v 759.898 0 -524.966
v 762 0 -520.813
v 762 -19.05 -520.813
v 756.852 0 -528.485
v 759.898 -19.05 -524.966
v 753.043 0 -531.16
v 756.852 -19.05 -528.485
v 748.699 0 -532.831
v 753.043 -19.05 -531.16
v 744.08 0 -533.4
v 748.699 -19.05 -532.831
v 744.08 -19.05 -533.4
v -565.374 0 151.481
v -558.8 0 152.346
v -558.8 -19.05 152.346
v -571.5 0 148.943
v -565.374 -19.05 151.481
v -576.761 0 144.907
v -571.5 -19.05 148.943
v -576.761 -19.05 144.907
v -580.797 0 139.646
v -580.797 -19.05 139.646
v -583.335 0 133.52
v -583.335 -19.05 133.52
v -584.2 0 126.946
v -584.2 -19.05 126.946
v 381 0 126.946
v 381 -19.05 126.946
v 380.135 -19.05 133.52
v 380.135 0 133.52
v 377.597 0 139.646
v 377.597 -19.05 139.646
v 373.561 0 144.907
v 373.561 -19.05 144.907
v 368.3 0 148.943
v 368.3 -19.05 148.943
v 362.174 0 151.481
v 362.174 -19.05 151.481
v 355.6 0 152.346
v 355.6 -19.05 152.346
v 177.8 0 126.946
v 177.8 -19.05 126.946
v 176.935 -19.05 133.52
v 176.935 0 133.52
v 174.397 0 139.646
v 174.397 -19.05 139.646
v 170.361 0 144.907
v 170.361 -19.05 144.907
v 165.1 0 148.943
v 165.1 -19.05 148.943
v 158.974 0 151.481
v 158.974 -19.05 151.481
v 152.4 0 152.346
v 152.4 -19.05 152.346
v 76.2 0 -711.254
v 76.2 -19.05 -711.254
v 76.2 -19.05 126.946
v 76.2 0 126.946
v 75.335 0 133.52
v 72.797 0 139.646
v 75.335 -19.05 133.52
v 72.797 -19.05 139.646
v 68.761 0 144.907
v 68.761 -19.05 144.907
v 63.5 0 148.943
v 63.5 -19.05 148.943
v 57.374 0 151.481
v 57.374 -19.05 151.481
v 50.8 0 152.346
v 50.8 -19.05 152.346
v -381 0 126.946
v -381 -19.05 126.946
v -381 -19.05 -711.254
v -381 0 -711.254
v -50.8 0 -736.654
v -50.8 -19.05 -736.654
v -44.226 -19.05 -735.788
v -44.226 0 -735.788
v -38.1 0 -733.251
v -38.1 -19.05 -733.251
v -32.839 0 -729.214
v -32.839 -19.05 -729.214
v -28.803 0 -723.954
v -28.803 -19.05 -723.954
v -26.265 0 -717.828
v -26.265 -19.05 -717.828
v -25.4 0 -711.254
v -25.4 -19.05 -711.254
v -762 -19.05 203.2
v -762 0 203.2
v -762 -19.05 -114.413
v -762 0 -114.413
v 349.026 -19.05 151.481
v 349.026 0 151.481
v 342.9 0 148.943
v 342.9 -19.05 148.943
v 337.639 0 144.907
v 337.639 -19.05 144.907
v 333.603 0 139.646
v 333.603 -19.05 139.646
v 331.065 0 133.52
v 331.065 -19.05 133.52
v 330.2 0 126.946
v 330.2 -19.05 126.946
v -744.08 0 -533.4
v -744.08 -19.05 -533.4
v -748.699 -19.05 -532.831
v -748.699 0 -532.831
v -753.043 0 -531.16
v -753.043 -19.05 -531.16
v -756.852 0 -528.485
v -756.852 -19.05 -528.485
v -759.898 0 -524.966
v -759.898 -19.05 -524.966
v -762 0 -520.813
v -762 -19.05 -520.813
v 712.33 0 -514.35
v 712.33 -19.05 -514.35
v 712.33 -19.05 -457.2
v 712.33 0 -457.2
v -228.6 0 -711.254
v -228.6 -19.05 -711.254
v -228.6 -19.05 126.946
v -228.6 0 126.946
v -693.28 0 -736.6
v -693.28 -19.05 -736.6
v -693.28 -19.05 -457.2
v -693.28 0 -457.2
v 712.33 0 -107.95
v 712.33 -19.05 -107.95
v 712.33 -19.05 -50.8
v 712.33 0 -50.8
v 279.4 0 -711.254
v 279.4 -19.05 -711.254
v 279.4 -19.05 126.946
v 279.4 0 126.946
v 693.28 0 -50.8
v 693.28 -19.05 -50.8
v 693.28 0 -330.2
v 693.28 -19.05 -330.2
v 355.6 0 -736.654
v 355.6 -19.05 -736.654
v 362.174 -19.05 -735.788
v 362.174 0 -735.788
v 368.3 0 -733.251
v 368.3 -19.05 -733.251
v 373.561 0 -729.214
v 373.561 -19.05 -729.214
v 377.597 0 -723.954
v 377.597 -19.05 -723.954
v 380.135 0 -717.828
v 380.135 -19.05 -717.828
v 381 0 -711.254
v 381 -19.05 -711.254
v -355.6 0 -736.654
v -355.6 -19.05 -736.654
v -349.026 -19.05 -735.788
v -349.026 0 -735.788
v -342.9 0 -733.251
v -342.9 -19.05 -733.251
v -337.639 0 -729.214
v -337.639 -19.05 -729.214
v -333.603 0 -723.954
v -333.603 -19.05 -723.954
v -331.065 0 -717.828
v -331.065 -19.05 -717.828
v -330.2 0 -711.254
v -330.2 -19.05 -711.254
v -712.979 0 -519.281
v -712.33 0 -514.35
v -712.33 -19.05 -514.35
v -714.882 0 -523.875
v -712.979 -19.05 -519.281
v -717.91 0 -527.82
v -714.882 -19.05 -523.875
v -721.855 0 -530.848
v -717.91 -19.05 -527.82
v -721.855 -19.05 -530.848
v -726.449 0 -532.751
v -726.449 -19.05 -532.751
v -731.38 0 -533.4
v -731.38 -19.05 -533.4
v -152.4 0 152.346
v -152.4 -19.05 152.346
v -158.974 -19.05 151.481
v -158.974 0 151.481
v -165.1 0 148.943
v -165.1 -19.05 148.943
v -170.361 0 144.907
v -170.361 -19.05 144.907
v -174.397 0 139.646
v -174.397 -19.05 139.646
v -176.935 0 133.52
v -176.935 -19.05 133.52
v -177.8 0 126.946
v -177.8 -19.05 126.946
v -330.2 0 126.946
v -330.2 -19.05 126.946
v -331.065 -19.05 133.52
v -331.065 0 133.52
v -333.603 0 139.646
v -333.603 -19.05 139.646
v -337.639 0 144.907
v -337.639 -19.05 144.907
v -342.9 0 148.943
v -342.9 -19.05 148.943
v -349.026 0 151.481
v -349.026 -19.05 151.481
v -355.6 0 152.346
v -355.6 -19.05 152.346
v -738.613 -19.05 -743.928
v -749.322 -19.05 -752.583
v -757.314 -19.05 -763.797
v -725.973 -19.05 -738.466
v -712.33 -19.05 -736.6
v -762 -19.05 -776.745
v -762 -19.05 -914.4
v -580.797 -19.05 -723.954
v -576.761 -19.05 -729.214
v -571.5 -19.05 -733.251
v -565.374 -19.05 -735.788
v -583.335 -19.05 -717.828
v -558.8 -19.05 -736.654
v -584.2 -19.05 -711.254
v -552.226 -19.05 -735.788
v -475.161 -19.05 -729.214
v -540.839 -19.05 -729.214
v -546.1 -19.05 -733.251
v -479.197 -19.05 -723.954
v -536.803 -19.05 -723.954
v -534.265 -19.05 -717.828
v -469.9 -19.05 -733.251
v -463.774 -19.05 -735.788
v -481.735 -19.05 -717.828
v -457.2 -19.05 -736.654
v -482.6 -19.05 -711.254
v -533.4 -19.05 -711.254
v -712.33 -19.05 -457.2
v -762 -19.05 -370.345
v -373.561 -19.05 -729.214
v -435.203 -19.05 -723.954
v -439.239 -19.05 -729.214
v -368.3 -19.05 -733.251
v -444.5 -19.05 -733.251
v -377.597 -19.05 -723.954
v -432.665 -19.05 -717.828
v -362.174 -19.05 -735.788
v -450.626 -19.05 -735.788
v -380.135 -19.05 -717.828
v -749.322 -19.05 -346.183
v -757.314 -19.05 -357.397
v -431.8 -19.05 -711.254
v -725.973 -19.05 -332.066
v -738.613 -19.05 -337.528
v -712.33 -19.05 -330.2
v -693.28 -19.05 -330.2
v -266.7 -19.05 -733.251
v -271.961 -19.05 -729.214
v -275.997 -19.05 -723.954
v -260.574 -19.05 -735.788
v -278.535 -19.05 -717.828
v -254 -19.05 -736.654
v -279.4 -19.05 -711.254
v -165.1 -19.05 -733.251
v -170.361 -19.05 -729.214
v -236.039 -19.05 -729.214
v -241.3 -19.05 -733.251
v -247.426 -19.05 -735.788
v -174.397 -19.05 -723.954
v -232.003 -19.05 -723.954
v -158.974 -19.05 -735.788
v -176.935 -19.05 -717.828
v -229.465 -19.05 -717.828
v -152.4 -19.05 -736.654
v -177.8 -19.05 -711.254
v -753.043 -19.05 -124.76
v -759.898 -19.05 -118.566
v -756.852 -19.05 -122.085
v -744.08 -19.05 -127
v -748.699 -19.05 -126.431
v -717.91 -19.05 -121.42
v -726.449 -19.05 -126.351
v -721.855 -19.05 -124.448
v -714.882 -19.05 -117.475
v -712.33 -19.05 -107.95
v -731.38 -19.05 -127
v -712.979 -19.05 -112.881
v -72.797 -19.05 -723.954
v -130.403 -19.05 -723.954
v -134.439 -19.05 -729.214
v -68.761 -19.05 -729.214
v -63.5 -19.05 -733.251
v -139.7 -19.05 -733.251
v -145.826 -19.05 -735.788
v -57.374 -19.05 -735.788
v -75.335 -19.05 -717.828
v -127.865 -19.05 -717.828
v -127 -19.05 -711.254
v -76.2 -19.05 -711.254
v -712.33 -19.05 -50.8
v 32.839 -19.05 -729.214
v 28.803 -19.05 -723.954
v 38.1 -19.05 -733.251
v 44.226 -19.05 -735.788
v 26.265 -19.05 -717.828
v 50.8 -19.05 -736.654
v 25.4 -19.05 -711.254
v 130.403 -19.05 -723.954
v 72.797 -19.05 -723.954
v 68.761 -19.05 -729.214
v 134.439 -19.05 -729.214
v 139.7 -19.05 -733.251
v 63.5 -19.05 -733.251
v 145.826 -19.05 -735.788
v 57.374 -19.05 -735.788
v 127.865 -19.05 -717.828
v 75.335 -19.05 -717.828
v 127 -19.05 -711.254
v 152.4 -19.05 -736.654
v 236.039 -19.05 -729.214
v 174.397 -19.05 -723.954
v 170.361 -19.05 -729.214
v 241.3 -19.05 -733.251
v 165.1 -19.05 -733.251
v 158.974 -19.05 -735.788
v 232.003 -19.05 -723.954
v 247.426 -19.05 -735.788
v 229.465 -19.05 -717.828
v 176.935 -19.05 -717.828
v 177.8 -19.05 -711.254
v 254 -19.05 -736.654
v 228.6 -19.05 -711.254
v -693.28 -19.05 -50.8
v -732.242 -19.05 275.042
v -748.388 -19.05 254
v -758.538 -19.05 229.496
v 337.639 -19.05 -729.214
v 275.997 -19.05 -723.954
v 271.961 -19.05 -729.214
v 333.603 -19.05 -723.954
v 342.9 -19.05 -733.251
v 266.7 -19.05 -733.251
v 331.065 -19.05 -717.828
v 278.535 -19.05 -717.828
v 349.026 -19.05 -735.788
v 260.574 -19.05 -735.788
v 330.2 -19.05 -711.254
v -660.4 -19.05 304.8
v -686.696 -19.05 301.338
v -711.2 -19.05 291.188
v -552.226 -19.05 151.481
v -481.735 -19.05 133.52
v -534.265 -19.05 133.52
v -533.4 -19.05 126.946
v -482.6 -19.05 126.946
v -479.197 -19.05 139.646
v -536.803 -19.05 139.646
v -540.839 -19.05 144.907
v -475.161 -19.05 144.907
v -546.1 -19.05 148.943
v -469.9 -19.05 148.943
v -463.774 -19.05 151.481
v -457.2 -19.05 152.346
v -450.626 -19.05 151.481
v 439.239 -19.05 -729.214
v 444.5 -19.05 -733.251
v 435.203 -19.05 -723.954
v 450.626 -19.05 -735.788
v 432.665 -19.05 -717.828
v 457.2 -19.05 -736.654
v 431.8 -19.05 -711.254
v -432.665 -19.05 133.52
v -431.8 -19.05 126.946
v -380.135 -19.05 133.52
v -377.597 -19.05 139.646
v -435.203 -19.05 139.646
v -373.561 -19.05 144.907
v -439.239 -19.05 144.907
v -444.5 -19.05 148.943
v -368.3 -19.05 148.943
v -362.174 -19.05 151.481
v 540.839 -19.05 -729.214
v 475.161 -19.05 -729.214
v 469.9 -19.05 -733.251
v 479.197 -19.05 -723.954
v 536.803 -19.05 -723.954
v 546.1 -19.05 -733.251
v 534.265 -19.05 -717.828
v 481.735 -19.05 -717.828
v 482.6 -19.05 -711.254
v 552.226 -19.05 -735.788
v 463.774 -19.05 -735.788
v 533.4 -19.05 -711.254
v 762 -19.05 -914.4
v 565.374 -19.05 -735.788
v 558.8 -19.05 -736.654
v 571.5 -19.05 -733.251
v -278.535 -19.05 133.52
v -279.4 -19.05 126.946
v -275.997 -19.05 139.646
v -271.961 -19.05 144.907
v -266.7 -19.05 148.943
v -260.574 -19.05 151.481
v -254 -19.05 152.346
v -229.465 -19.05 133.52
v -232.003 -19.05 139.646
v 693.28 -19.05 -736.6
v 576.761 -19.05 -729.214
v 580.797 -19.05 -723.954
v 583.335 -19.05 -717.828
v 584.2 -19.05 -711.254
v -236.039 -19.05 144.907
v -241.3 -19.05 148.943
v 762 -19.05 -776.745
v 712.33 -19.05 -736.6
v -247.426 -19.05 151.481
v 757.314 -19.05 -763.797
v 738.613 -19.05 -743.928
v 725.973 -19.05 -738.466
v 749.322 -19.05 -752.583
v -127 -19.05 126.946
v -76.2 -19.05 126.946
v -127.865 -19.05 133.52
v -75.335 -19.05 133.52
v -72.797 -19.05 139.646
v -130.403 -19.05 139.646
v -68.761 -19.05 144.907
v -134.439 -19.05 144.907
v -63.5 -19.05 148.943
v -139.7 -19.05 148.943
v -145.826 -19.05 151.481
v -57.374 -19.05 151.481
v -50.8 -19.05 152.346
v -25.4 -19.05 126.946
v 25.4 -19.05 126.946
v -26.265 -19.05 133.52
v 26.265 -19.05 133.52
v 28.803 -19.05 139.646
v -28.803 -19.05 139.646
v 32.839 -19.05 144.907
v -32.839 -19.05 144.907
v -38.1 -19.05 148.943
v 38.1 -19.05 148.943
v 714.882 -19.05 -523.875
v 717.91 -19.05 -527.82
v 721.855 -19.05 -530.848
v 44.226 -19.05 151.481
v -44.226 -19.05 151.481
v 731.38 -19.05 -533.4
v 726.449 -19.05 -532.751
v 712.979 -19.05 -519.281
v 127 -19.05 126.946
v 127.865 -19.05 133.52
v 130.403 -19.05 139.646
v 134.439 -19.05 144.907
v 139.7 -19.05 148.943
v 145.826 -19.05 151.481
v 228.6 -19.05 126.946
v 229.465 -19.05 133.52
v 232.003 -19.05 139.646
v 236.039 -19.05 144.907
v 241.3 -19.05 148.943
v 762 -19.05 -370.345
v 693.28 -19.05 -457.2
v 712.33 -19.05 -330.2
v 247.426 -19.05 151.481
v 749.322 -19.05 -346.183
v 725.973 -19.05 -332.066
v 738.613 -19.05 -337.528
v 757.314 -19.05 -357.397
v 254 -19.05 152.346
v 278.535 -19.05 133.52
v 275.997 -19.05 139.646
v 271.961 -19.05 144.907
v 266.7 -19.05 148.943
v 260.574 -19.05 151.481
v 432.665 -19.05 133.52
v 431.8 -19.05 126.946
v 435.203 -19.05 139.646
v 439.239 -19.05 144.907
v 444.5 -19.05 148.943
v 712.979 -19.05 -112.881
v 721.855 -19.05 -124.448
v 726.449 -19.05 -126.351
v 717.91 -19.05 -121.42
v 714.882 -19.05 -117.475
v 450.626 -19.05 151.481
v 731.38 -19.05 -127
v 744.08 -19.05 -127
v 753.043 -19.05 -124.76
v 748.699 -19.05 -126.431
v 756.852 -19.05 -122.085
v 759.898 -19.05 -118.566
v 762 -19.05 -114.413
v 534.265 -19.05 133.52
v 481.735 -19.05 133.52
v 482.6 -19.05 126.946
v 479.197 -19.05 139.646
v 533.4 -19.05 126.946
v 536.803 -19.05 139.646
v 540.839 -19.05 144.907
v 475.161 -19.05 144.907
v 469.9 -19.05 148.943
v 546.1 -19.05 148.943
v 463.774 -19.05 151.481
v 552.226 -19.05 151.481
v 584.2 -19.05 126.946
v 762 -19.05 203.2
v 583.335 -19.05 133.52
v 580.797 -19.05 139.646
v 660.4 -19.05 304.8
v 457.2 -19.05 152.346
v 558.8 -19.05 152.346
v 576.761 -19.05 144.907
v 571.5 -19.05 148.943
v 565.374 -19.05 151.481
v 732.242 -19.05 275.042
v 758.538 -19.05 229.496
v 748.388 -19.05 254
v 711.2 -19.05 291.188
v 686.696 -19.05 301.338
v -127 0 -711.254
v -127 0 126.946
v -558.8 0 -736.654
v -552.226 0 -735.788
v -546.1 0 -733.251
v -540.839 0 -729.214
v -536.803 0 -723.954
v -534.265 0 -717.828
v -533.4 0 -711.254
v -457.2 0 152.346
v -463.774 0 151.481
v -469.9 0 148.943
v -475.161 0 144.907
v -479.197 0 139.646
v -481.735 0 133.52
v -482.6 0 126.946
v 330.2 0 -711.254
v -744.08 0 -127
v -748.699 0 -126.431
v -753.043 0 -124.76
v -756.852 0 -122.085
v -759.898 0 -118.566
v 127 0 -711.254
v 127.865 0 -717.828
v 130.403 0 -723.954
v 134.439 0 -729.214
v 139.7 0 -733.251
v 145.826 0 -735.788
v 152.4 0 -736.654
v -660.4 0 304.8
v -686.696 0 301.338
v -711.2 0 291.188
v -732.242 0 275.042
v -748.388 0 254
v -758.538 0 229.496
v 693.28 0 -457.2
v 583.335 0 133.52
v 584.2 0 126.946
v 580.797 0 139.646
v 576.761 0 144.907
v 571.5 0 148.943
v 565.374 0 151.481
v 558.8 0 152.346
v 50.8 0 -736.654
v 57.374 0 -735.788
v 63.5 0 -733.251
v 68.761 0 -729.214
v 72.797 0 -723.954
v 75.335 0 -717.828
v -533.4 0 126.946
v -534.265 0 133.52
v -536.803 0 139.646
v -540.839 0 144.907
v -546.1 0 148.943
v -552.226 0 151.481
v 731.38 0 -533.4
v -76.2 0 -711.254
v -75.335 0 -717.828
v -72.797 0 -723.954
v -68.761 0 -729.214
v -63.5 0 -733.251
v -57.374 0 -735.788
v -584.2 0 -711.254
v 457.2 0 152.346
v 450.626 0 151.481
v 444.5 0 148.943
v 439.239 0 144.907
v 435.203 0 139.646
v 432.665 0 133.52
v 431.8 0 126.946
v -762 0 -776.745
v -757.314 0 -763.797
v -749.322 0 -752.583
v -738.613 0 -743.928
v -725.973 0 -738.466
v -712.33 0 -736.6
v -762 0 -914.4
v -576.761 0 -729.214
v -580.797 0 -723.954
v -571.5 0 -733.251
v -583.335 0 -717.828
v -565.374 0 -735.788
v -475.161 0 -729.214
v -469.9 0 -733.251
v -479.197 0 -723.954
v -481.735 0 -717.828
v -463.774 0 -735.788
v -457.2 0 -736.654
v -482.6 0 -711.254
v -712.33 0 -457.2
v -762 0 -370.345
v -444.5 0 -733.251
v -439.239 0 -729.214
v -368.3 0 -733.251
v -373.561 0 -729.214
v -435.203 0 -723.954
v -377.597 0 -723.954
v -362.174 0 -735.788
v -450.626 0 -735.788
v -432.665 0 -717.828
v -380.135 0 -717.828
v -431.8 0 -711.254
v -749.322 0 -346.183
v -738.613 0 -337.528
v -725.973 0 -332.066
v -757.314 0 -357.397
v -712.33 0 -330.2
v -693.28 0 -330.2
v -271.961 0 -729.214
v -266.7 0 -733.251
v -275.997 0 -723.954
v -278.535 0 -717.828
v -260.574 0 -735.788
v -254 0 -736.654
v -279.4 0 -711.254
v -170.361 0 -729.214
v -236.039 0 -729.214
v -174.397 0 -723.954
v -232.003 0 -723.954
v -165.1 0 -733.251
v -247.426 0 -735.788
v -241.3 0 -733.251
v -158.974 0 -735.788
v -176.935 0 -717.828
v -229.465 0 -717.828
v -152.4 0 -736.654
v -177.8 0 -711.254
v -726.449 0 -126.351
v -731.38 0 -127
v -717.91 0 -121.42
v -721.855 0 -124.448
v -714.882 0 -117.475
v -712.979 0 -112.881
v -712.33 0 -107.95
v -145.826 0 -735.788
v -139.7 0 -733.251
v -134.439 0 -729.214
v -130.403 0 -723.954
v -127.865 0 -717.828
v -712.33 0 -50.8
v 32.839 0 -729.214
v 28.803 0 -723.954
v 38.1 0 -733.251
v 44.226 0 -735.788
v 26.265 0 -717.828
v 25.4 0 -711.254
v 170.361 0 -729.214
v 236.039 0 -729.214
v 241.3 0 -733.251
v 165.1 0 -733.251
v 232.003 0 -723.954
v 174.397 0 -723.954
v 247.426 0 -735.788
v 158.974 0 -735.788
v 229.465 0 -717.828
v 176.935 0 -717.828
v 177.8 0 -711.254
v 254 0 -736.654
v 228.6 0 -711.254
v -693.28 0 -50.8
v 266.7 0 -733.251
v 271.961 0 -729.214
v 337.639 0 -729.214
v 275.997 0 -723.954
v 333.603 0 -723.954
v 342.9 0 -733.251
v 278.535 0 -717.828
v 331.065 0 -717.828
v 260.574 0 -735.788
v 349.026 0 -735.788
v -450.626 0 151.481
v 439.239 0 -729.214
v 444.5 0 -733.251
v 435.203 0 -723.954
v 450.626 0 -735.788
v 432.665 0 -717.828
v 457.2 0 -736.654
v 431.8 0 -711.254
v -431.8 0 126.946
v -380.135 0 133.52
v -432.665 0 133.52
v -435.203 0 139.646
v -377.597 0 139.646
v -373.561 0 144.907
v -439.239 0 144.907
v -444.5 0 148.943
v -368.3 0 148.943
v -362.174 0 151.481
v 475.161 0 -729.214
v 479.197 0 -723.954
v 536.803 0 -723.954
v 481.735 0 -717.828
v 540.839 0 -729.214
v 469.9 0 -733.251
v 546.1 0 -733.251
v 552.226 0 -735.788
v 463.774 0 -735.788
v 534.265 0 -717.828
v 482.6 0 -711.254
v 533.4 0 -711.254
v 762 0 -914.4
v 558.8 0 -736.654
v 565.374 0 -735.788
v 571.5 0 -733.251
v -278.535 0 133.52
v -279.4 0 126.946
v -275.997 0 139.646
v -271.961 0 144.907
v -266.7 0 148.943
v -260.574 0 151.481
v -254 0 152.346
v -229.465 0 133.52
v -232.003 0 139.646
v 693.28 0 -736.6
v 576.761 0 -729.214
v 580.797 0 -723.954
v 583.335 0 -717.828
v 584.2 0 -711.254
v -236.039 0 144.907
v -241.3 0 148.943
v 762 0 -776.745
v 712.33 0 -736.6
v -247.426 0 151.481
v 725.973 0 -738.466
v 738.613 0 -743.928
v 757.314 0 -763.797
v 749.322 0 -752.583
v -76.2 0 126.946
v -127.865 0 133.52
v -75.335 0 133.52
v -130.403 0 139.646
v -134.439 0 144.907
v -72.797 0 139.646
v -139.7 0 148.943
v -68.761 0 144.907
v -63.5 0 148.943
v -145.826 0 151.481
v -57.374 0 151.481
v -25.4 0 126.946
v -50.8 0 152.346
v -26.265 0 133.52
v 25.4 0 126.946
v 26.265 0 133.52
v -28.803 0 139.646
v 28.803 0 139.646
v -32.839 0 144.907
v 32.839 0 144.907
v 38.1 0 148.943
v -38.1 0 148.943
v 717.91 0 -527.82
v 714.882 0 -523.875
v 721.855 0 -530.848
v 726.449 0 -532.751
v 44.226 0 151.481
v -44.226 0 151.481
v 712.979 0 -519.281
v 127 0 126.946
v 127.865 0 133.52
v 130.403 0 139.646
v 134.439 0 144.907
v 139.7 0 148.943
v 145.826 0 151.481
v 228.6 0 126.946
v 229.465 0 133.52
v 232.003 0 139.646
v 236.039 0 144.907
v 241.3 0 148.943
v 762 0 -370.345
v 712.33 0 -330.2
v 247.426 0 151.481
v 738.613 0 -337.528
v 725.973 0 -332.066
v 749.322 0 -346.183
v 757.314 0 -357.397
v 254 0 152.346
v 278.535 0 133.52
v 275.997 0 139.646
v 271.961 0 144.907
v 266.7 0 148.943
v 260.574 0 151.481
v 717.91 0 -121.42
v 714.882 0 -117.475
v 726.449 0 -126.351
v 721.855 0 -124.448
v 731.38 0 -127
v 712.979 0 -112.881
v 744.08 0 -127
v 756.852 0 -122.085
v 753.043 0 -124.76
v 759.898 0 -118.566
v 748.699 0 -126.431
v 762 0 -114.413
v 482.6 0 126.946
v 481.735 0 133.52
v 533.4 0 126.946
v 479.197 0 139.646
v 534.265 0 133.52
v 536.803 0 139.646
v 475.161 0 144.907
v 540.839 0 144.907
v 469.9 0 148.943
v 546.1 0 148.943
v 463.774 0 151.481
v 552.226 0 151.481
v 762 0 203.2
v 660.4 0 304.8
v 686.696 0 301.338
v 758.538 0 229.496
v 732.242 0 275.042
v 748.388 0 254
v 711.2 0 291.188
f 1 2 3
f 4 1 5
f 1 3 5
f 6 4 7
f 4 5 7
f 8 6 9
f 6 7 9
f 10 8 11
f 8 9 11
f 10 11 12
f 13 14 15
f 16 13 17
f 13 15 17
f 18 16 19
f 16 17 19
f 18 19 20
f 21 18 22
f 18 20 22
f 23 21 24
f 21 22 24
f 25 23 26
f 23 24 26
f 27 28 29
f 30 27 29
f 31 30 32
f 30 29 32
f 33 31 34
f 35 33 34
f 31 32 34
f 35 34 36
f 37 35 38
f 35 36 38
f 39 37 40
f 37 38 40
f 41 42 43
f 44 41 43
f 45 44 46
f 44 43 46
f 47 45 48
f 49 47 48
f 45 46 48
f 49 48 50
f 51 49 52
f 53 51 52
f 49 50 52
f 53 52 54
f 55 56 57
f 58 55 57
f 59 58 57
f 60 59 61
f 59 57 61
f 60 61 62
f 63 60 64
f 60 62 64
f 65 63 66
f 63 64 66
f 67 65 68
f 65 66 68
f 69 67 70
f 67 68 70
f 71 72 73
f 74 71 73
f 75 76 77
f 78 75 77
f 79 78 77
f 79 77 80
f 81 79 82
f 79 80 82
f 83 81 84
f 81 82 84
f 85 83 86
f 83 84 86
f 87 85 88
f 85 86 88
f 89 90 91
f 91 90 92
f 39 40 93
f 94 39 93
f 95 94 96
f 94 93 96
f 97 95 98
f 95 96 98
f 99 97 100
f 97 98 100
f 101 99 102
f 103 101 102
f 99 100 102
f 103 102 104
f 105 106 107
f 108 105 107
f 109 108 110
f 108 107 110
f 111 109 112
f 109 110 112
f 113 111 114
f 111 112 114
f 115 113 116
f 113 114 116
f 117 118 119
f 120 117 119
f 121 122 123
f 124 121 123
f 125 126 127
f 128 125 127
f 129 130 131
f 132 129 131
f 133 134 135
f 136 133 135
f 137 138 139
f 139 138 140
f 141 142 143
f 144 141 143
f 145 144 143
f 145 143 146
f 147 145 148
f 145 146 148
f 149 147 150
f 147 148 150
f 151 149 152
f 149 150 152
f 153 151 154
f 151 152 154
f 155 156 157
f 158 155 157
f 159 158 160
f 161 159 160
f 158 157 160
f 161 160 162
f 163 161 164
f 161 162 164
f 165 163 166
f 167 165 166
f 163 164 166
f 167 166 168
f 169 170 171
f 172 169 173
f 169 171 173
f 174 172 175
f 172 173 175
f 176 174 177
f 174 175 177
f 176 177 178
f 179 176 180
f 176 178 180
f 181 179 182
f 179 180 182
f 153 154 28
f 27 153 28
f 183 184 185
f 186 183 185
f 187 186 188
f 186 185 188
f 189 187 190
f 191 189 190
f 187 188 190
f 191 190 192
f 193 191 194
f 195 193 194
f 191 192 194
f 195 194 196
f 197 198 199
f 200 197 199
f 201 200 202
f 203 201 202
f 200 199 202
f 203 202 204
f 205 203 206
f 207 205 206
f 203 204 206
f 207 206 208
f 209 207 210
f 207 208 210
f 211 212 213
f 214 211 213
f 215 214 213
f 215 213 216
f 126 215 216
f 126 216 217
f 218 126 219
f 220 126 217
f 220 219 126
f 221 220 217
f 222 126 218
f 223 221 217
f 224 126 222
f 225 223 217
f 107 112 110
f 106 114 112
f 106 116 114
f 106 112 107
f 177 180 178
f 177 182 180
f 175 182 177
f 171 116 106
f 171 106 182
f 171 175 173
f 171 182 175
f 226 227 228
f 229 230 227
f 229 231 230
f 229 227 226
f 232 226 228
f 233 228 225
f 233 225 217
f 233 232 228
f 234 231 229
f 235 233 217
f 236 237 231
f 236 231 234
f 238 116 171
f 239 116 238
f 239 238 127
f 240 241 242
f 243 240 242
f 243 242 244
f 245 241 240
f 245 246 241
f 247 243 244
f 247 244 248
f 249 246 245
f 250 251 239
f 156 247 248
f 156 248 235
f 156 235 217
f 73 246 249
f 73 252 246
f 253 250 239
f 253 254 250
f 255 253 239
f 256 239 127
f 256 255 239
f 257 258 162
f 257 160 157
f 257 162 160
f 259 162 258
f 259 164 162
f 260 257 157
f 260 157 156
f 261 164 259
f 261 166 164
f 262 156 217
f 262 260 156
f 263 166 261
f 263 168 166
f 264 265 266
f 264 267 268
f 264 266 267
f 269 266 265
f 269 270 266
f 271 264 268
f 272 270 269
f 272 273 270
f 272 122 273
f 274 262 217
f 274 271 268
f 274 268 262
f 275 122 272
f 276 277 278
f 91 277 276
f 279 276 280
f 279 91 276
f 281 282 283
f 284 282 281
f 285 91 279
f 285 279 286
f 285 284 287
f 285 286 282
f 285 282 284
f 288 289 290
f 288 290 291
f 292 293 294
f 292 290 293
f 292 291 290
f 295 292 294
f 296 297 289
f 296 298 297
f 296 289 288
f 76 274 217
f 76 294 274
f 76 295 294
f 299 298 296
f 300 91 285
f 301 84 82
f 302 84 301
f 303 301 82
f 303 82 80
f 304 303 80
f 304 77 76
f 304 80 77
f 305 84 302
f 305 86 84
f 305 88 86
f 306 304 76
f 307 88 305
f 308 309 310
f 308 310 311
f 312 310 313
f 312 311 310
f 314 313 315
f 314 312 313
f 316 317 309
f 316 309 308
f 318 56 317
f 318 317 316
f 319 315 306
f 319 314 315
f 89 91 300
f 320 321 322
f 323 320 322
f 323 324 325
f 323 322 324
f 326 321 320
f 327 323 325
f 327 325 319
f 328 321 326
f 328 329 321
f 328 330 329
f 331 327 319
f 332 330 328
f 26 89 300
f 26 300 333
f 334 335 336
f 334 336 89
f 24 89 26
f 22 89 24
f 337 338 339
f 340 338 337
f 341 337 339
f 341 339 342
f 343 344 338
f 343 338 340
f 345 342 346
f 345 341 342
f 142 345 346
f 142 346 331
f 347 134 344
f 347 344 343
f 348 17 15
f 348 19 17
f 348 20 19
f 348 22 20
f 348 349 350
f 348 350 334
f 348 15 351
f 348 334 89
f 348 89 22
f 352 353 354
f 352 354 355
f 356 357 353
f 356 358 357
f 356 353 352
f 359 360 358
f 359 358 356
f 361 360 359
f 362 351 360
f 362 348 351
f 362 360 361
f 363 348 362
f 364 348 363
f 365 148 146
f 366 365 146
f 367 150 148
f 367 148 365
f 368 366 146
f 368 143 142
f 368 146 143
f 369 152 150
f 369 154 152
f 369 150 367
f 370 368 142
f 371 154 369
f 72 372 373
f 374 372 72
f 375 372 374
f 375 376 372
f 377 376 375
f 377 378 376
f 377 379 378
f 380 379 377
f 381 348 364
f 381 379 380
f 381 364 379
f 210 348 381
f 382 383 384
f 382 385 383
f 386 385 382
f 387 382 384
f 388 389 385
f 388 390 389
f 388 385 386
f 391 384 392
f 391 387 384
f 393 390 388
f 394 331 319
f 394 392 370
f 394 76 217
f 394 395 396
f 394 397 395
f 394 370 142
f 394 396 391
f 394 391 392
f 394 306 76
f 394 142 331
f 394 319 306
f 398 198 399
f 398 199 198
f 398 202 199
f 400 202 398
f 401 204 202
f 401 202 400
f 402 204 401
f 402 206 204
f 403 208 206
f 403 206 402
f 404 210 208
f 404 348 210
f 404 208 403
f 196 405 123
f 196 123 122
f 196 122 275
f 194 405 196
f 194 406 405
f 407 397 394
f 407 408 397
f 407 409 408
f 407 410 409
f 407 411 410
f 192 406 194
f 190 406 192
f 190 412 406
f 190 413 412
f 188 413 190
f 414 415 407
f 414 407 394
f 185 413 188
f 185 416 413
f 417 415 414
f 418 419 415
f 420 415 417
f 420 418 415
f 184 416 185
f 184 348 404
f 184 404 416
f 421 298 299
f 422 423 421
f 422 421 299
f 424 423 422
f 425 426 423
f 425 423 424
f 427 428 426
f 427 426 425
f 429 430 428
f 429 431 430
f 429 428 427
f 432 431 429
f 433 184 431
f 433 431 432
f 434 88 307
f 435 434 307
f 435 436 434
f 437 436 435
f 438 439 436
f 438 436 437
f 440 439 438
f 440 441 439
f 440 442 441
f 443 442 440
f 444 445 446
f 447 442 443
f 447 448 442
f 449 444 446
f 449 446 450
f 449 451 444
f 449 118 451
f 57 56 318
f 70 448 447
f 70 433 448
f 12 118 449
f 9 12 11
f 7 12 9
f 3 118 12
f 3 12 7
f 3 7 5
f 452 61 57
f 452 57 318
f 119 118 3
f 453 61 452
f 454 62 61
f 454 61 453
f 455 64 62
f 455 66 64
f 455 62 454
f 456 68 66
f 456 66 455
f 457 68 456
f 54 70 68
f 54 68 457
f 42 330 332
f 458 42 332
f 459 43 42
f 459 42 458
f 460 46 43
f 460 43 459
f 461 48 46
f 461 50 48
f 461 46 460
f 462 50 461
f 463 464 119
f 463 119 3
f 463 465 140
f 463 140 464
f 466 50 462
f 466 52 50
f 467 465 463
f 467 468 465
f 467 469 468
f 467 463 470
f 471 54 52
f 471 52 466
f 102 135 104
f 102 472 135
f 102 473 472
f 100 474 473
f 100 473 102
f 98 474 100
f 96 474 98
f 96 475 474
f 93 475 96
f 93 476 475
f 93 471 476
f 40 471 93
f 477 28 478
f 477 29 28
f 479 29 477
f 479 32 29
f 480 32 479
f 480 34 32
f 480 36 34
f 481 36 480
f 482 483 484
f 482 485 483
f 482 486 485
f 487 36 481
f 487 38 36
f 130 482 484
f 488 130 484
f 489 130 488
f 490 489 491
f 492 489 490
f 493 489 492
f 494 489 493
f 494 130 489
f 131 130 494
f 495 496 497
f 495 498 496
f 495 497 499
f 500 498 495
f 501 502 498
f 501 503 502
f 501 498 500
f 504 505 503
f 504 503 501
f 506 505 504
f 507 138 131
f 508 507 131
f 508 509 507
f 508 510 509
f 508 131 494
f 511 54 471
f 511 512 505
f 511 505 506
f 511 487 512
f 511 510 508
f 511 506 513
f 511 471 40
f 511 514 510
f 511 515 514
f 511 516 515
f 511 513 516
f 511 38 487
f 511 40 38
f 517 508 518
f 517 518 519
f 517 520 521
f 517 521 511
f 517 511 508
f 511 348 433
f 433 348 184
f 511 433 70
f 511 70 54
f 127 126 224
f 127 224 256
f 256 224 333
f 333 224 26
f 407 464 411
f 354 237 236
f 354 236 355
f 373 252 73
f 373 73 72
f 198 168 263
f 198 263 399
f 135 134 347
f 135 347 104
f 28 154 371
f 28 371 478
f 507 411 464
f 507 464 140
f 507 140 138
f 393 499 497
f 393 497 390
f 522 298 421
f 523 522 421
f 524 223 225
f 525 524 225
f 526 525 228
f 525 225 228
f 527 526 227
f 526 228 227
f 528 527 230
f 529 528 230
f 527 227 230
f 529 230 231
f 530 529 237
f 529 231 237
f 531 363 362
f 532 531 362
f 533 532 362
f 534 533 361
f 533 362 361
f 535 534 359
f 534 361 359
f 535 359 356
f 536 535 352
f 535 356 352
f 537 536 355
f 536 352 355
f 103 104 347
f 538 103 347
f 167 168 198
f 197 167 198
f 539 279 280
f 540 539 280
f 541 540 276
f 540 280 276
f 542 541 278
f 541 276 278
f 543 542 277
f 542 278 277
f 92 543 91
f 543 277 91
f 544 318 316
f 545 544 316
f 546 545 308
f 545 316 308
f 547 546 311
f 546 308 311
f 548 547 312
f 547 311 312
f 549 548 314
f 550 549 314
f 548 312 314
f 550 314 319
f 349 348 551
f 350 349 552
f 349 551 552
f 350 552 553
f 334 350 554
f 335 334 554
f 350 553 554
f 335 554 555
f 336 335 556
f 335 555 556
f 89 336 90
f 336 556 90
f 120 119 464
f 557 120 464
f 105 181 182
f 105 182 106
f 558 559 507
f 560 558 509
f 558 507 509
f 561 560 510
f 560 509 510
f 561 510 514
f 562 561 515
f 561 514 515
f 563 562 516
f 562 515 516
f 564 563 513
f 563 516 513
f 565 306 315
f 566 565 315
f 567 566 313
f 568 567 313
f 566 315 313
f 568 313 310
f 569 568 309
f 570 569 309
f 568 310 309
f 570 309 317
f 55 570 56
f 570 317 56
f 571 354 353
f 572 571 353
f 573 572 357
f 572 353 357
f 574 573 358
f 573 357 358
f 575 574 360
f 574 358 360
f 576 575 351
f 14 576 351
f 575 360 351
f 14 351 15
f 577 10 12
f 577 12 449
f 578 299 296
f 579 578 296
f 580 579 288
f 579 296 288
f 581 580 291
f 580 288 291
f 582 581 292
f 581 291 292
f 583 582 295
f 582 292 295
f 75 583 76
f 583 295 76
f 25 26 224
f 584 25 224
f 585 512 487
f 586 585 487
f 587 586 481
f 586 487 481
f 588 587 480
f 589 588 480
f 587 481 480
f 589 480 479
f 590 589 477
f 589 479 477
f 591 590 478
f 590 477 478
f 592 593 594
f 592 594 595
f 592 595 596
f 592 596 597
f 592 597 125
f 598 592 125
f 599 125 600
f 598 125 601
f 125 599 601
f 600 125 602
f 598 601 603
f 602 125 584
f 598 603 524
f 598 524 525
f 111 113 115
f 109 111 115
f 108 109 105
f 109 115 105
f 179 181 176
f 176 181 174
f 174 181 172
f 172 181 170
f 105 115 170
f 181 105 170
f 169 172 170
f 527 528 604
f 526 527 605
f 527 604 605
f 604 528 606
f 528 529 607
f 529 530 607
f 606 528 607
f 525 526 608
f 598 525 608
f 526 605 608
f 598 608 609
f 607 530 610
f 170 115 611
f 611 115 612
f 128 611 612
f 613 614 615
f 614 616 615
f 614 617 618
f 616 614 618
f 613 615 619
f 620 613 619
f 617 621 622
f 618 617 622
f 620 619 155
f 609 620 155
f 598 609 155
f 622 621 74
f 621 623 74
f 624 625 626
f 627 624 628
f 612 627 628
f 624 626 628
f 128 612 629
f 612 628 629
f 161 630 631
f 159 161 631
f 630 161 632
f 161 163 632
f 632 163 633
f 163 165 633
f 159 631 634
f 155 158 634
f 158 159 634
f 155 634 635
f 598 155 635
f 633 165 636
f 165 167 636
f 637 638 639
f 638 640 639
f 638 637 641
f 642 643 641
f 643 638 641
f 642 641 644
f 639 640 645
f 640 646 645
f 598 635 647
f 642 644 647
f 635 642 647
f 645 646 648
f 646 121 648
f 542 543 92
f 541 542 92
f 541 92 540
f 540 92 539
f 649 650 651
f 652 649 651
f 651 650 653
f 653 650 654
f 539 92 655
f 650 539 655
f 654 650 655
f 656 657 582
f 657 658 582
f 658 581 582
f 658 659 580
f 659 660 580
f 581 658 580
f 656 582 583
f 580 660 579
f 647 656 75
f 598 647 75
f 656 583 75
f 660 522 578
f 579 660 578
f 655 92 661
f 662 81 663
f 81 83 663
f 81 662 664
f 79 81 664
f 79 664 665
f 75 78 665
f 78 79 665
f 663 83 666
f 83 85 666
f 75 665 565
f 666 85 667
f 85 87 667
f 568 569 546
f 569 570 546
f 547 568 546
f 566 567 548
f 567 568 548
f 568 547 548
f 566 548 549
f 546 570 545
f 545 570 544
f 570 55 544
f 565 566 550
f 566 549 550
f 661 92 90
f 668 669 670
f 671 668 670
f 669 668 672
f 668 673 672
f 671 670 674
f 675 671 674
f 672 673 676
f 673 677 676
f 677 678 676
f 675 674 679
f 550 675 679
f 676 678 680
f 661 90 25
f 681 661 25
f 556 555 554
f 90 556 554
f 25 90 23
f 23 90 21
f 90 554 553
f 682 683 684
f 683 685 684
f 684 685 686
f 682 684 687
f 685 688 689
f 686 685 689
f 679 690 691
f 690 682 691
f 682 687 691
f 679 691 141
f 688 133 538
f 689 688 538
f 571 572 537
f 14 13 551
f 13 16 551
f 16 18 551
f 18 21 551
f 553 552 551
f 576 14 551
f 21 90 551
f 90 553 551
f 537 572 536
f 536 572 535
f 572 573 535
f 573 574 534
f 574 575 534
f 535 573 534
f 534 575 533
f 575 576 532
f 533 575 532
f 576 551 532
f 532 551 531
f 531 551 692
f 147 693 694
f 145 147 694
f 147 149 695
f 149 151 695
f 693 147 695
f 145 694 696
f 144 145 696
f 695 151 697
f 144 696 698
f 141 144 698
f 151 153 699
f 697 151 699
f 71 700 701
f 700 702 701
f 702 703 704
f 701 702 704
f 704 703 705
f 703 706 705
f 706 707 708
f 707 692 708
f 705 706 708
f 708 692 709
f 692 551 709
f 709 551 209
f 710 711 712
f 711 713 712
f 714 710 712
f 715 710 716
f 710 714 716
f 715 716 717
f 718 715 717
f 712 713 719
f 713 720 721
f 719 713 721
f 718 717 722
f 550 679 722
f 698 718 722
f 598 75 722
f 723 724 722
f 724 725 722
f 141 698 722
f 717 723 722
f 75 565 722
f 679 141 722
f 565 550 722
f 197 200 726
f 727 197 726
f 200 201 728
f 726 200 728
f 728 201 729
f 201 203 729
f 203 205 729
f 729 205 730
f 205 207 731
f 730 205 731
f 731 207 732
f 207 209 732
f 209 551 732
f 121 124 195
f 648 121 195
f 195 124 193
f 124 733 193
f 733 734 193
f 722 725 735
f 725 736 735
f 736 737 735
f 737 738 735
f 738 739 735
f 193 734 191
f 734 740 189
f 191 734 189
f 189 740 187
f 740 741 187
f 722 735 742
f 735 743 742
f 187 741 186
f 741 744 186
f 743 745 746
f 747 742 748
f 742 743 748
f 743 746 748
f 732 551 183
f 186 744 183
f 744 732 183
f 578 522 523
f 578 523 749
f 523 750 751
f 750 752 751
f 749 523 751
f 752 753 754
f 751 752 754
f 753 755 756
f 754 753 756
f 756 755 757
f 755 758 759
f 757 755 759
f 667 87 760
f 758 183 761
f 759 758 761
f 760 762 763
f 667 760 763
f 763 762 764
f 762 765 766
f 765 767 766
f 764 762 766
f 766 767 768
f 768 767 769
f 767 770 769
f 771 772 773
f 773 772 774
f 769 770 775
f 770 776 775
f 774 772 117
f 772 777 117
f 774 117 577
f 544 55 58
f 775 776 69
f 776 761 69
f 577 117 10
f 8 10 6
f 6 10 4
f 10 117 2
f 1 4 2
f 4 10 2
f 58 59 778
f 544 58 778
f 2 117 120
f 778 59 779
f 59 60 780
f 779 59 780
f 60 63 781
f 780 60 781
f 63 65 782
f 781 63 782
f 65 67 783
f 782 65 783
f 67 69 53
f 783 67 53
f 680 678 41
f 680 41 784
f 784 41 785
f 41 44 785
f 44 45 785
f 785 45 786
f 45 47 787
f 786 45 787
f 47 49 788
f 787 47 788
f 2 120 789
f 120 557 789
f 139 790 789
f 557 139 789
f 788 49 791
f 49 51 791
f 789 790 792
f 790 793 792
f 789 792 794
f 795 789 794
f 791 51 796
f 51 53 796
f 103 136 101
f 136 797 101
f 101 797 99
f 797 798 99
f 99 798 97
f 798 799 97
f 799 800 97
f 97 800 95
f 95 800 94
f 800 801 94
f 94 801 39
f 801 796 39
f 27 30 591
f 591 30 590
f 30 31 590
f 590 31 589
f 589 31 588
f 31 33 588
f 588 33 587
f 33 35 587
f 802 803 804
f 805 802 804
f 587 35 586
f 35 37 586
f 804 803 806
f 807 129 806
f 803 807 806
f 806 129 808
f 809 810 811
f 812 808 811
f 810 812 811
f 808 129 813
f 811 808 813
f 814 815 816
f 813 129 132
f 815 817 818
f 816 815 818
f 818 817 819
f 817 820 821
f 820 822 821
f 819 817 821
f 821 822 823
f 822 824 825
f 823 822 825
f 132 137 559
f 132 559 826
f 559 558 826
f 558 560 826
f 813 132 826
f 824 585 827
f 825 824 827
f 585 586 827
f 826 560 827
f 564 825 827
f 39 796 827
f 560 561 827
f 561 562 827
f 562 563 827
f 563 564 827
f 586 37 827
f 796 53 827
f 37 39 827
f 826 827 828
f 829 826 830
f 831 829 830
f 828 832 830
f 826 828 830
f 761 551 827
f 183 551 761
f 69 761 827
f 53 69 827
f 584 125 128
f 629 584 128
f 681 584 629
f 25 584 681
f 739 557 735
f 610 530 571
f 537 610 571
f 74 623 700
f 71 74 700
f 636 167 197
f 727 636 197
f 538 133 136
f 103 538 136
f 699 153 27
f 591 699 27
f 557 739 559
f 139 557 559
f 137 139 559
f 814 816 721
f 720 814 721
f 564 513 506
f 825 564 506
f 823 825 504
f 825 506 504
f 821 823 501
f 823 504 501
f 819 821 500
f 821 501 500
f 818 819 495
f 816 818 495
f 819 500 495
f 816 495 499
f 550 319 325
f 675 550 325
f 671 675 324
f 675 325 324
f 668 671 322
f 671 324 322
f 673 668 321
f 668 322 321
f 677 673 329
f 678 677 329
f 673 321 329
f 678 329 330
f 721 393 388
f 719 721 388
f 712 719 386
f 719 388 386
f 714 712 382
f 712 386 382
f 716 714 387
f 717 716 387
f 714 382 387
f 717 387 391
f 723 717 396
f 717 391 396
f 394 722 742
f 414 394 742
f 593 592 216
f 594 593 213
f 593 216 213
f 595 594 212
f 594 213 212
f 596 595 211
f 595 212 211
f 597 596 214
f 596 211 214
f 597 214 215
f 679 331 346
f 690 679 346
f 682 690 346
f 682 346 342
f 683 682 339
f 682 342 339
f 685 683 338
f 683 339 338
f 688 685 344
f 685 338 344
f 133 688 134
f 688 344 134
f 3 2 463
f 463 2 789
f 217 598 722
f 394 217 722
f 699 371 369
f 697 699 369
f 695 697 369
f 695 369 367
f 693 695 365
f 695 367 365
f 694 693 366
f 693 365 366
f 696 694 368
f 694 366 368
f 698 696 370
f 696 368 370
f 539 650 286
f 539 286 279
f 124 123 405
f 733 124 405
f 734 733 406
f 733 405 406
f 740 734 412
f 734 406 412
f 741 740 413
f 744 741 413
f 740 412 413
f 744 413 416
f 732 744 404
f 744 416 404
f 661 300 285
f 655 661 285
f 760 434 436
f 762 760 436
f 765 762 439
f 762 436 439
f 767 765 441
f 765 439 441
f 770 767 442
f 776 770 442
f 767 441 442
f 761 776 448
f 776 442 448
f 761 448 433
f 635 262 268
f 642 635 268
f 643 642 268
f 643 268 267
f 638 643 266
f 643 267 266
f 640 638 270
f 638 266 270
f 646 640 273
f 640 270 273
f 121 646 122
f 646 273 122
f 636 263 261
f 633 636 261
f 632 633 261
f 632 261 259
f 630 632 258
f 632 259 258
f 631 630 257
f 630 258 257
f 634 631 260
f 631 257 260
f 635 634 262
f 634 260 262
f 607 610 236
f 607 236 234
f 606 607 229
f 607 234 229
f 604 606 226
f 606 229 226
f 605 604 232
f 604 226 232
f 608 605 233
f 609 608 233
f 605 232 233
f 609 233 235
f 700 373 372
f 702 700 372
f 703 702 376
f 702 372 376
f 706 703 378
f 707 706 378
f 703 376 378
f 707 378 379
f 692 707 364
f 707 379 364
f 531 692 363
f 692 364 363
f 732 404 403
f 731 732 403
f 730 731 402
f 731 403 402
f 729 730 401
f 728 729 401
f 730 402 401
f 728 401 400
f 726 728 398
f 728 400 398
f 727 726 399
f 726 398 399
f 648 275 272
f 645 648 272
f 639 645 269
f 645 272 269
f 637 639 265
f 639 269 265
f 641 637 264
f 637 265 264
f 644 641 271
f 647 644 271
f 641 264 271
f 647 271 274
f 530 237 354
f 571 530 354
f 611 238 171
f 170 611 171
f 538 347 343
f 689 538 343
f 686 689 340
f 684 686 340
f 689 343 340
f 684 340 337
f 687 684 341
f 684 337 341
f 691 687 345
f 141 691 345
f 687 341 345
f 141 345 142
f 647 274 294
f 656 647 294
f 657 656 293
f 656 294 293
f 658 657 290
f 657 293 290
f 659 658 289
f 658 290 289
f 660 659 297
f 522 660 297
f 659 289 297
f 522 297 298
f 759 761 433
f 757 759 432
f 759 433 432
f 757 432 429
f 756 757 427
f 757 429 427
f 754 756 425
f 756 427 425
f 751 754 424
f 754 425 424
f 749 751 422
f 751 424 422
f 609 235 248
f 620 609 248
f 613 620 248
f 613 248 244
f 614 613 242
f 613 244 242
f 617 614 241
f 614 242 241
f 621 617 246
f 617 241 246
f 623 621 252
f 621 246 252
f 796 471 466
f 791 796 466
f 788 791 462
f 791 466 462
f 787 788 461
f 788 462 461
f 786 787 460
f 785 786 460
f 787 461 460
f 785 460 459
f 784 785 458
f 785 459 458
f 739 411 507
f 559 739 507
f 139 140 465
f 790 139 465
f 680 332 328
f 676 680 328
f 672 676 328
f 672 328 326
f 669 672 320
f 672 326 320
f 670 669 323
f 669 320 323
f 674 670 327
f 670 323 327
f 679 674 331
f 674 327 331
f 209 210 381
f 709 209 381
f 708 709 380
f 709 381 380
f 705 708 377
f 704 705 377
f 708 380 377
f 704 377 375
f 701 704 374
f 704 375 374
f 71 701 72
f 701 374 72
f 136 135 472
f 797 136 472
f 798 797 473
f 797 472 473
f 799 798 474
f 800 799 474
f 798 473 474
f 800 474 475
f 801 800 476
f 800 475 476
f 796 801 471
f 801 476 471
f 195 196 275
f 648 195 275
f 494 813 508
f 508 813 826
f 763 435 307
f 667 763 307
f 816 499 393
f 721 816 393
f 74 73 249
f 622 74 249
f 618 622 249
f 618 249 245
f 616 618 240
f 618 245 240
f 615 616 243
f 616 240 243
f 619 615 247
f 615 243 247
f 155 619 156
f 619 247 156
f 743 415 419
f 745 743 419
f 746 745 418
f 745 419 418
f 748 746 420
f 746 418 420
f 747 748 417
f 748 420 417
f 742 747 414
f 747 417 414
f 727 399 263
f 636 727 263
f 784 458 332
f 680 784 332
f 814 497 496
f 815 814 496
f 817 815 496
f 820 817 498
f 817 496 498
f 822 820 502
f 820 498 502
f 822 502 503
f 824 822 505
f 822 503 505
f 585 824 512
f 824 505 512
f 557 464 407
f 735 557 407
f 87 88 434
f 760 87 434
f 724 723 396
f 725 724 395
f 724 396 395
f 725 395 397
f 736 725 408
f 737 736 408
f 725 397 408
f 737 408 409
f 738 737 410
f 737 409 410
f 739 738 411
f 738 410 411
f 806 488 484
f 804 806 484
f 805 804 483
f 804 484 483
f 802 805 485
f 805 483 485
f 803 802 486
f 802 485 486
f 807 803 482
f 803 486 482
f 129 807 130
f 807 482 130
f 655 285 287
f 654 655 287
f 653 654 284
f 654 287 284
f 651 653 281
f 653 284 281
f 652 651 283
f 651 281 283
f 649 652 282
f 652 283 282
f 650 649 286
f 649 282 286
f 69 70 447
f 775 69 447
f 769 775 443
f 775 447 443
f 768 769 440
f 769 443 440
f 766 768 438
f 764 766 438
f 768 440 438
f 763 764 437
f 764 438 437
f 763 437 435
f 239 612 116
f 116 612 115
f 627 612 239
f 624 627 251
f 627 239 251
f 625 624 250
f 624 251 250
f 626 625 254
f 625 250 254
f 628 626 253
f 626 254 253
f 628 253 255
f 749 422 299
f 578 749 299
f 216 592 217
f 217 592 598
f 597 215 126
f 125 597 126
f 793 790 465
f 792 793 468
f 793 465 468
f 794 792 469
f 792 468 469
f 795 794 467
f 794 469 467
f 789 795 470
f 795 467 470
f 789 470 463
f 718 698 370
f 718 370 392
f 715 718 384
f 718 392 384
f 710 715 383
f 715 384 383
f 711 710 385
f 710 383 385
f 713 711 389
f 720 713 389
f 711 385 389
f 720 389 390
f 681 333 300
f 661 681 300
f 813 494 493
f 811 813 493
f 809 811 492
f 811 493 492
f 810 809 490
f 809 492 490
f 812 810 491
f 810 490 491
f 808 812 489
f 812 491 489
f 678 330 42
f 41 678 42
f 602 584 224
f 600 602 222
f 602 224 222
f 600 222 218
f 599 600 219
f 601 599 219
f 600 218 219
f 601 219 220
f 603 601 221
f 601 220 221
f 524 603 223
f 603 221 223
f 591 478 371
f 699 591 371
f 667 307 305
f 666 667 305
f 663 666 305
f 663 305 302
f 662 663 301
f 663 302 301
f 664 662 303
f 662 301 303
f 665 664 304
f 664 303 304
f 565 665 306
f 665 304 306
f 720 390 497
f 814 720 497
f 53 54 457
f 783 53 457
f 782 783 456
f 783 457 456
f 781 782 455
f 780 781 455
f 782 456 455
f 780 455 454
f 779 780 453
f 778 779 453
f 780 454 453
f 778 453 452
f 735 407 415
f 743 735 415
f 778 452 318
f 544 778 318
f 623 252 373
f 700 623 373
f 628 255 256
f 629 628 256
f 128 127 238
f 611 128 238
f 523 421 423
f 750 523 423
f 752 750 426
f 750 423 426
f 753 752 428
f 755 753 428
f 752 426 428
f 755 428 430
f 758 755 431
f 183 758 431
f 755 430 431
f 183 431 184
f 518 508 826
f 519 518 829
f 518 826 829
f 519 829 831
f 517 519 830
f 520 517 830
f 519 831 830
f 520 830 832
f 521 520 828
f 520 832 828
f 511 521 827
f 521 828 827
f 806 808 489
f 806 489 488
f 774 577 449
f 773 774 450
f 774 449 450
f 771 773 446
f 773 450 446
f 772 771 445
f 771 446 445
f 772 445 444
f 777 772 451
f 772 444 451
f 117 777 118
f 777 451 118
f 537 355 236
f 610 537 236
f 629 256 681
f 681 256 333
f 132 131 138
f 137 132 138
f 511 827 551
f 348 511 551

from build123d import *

# Parameters (mm, degrees)
F1_DEPTH = 19.05
F3_DEPTH = 19.051
F5_DEPTH = 19.051


with BuildPart() as f1:
    # F0 (on Front) → F1 (new body)
    with BuildSketch(Plane.XZ):
        with BuildLine():
            Line((660.4, 304.8), (-660.4, 304.8))
            ThreePointArc((-660.4, 304.8), (-732.242049, 275.042049), (-762, 203.2))
            Line((-762, 203.2), (-762, -914.4))
            Line((-762, -914.4), (762, -914.4))
            Line((762, -914.4), (762, 203.2))
            ThreePointArc((762, 203.2), (732.242049, 275.042049), (660.4, 304.8))
        make_face()
    extrude(amount=F1_DEPTH)

    # F2 (on face) → F3 (cut, through all)
    with BuildSketch(Plane.XZ.offset(19.05)):
        with BuildLine():
            Line((-731.379947, -127), (-744.079947, -127))
            ThreePointArc((-744.079947, -127), (-757.550331, -121.420384), (-763.129947, -107.95))
            Line((-763.129947, -107.95), (-763.129947, -50.8))
            Line((-763.129947, -50.8), (-839.329947, -50.8))
            Line((-839.329947, -50.8), (-839.329947, -431.8))
            Line((-839.329947, -431.8), (-763.129947, -431.8))
            Line((-763.129947, -431.8), (-763.129947, -381))
            ThreePointArc((-763.129947, -381), (-748.250971, -345.078976), (-712.329947, -330.2))
            Line((-712.329947, -330.2), (-693.279947, -330.2))
            Line((-693.279947, -330.2), (-693.279947, -50.8))
            Line((-693.279947, -50.8), (-712.329947, -50.8))
            Line((-712.329947, -50.8), (-712.329947, -107.95))
            ThreePointArc((-712.329947, -107.95), (-717.909562, -121.420384), (-731.379947, -127))
        make_face()
        with BuildLine():
            Line((-712.329947, -457.2), (-712.329947, -514.35))
            ThreePointArc((-712.329947, -514.35), (-717.909562, -527.820384), (-731.379947, -533.4))
            Line((-731.379947, -533.4), (-744.079947, -533.4))
            ThreePointArc((-744.079947, -533.4), (-757.550331, -527.820384), (-763.129947, -514.35))
            Line((-763.129947, -514.35), (-763.129947, -457.2))
            Line((-763.129947, -457.2), (-839.329947, -457.2))
            Line((-839.329947, -457.2), (-839.329947, -838.2))
            Line((-839.329947, -838.2), (-763.129947, -838.2))
            Line((-763.129947, -838.2), (-763.129947, -787.4))
            ThreePointArc((-763.129947, -787.4), (-748.250971, -751.478976), (-712.329947, -736.6))
            Line((-712.329947, -736.6), (-693.279947, -736.6))
            Line((-693.279947, -736.6), (-693.279947, -457.2))
            Line((-693.279947, -457.2), (-712.329947, -457.2))
        make_face()
        with BuildLine():
            ThreePointArc((763.129947, -107.95), (757.550331, -121.420384), (744.079947, -127))
            Line((744.079947, -127), (731.379947, -127))
            ThreePointArc((731.379947, -127), (717.909562, -121.420384), (712.329947, -107.95))
            Line((712.329947, -107.95), (712.329947, -50.8))
            Line((712.329947, -50.8), (693.279947, -50.8))
            Line((693.279947, -50.8), (693.279947, -330.2))
            Line((693.279947, -330.2), (712.329947, -330.2))
            ThreePointArc((712.329947, -330.2), (748.250971, -345.078976), (763.129947, -381))
            Line((763.129947, -381), (763.129947, -431.8))
            Line((763.129947, -431.8), (839.329947, -431.8))
            Line((839.329947, -431.8), (839.329947, -50.8))
            Line((839.329947, -50.8), (763.129947, -50.8))
            Line((763.129947, -50.8), (763.129947, -107.95))
        make_face()
        with BuildLine():
            Line((693.279947, -457.2), (693.279947, -736.6))
            Line((693.279947, -736.6), (712.329947, -736.6))
            ThreePointArc((712.329947, -736.6), (748.250971, -751.478976), (763.129947, -787.4))
            Line((763.129947, -787.4), (763.129947, -838.2))
            Line((763.129947, -838.2), (839.329947, -838.2))
            Line((839.329947, -838.2), (839.329947, -457.2))
            Line((839.329947, -457.2), (763.129947, -457.2))
            Line((763.129947, -457.2), (763.129947, -514.35))
            ThreePointArc((763.129947, -514.35), (757.550331, -527.820384), (744.079947, -533.4))
            Line((744.079947, -533.4), (731.379947, -533.4))
            ThreePointArc((731.379947, -533.4), (717.909562, -527.820384), (712.329947, -514.35))
            Line((712.329947, -514.35), (712.329947, -457.2))
            Line((712.329947, -457.2), (693.279947, -457.2))
        make_face()
    extrude(amount=-F3_DEPTH, mode=Mode.SUBTRACT)

    # F4 (on face) → F5 (cut, through all)
    with BuildSketch(Plane.XZ.offset(19.05)):
        with BuildLine():
            ThreePointArc((-50.8, 152.346021), (-68.760512, 144.906534), (-76.2, 126.946021))
            Line((-76.2, 126.946021), (-76.2, -711.253979))
            ThreePointArc((-76.2, -711.253979), (-68.760512, -729.214491), (-50.8, -736.653979))
            ThreePointArc((-50.8, -736.653979), (-32.839488, -729.214491), (-25.4, -711.253979))
            Line((-25.4, -711.253979), (-25.4, 126.946021))
            ThreePointArc((-25.4, 126.946021), (-32.839488, 144.906534), (-50.8, 152.346021))
        make_face()
        with BuildLine():
            ThreePointArc((-152.4, 152.346021), (-170.360512, 144.906534), (-177.8, 126.946021))
            Line((-177.8, 126.946021), (-177.8, -711.253979))
            ThreePointArc((-177.8, -711.253979), (-170.360512, -729.214491), (-152.4, -736.653979))
            ThreePointArc((-152.4, -736.653979), (-134.439488, -729.214491), (-127, -711.253979))
            Line((-127, -711.253979), (-127, 126.946021))
            ThreePointArc((-127, 126.946021), (-134.439488, 144.906534), (-152.4, 152.346021))
        make_face()
        with BuildLine():
            ThreePointArc((-254, 152.346021), (-271.960512, 144.906534), (-279.4, 126.946021))
            Line((-279.4, 126.946021), (-279.4, -711.253979))
            ThreePointArc((-279.4, -711.253979), (-271.960512, -729.214491), (-254, -736.653979))
            ThreePointArc((-254, -736.653979), (-236.039488, -729.214491), (-228.6, -711.253979))
            Line((-228.6, -711.253979), (-228.6, 126.946021))
            ThreePointArc((-228.6, 126.946021), (-236.039488, 144.906534), (-254, 152.346021))
        make_face()
        with BuildLine():
            ThreePointArc((-355.6, 152.346021), (-373.560512, 144.906534), (-381, 126.946021))
            Line((-381, 126.946021), (-381, -711.253979))
            ThreePointArc((-381, -711.253979), (-373.560512, -729.214491), (-355.6, -736.653979))
            ThreePointArc((-355.6, -736.653979), (-337.639488, -729.214491), (-330.2, -711.253979))
            Line((-330.2, -711.253979), (-330.2, 126.946021))
            ThreePointArc((-330.2, 126.946021), (-337.639488, 144.906534), (-355.6, 152.346021))
        make_face()
        with BuildLine():
            ThreePointArc((-457.2, 152.346021), (-475.160512, 144.906534), (-482.6, 126.946021))
            Line((-482.6, 126.946021), (-482.6, -711.253979))
            ThreePointArc((-482.6, -711.253979), (-475.160512, -729.214491), (-457.2, -736.653979))
            ThreePointArc((-457.2, -736.653979), (-439.239488, -729.214491), (-431.8, -711.253979))
            Line((-431.8, -711.253979), (-431.8, 126.946021))
            ThreePointArc((-431.8, 126.946021), (-439.239488, 144.906534), (-457.2, 152.346021))
        make_face()
        with BuildLine():
            ThreePointArc((-558.8, 152.346021), (-576.760512, 144.906534), (-584.2, 126.946021))
            Line((-584.2, 126.946021), (-584.2, -711.253979))
            ThreePointArc((-584.2, -711.253979), (-576.760512, -729.214491), (-558.8, -736.653979))
            ThreePointArc((-558.8, -736.653979), (-540.839488, -729.214491), (-533.4, -711.253979))
            Line((-533.4, -711.253979), (-533.4, 126.946021))
            ThreePointArc((-533.4, 126.946021), (-540.839488, 144.906534), (-558.8, 152.346021))
        make_face()
        with BuildLine():
            ThreePointArc((127, -711.253979), (134.439488, -729.214491), (152.4, -736.653979))
            ThreePointArc((152.4, -736.653979), (170.360512, -729.214491), (177.8, -711.253979))
            Line((177.8, -711.253979), (177.8, 126.946021))
            ThreePointArc((177.8, 126.946021), (170.360512, 144.906534), (152.4, 152.346021))
            ThreePointArc((152.4, 152.346021), (134.439488, 144.906534), (127, 126.946021))
            Line((127, 126.946021), (127, -711.253979))
        make_face()
        with BuildLine():
            ThreePointArc((482.6, 126.946021), (475.160512, 144.906534), (457.2, 152.346021))
            ThreePointArc((457.2, 152.346021), (439.239488, 144.906534), (431.8, 126.946021))
            Line((431.8, 126.946021), (431.8, -711.253979))
            ThreePointArc((431.8, -711.253979), (439.239488, -729.214491), (457.2, -736.653979))
            ThreePointArc((457.2, -736.653979), (475.160512, -729.214491), (482.6, -711.253979))
            Line((482.6, -711.253979), (482.6, 126.946021))
        make_face()
        with BuildLine():
            ThreePointArc((254, -736.653979), (271.960512, -729.214491), (279.4, -711.253979))
            Line((279.4, -711.253979), (279.4, 126.946021))
            ThreePointArc((279.4, 126.946021), (271.960512, 144.906534), (254, 152.346021))
            ThreePointArc((254, 152.346021), (236.039488, 144.906534), (228.6, 126.946021))
            Line((228.6, 126.946021), (228.6, -711.253979))
            ThreePointArc((228.6, -711.253979), (236.039488, -729.214491), (254, -736.653979))
        make_face()
        with BuildLine():
            ThreePointArc((558.8, 152.346021), (540.839488, 144.906534), (533.4, 126.946021))
            Line((533.4, 126.946021), (533.4, -711.253979))
            ThreePointArc((533.4, -711.253979), (540.839488, -729.214491), (558.8, -736.653979))
            ThreePointArc((558.8, -736.653979), (576.760512, -729.214491), (584.2, -711.253979))
            Line((584.2, -711.253979), (584.2, 126.946021))
            ThreePointArc((584.2, 126.946021), (576.760512, 144.906534), (558.8, 152.346021))
        make_face()
        with BuildLine():
            ThreePointArc((355.6, 152.346021), (337.639488, 144.906534), (330.2, 126.946021))
            Line((330.2, 126.946021), (330.2, -711.253979))
            ThreePointArc((330.2, -711.253979), (337.639488, -729.214491), (355.6, -736.653979))
            ThreePointArc((355.6, -736.653979), (373.560512, -729.214491), (381, -711.253979))
            Line((381, -711.253979), (381, 126.946021))
            ThreePointArc((381, 126.946021), (373.560512, 144.906534), (355.6, 152.346021))
        make_face()
        with BuildLine():
            ThreePointArc((25.4, -711.253979), (32.839488, -729.214491), (50.8, -736.653979))
            ThreePointArc((50.8, -736.653979), (68.760512, -729.214491), (76.2, -711.253979))
            Line((76.2, -711.253979), (76.2, 126.946021))
            ThreePointArc((76.2, 126.946021), (68.760512, 144.906534), (50.8, 152.346021))
            ThreePointArc((50.8, 152.346021), (32.839488, 144.906534), (25.4, 126.946021))
            Line((25.4, 126.946021), (25.4, -711.253979))
        make_face()
    extrude(amount=-F5_DEPTH, mode=Mode.SUBTRACT)


solid = f1.part
